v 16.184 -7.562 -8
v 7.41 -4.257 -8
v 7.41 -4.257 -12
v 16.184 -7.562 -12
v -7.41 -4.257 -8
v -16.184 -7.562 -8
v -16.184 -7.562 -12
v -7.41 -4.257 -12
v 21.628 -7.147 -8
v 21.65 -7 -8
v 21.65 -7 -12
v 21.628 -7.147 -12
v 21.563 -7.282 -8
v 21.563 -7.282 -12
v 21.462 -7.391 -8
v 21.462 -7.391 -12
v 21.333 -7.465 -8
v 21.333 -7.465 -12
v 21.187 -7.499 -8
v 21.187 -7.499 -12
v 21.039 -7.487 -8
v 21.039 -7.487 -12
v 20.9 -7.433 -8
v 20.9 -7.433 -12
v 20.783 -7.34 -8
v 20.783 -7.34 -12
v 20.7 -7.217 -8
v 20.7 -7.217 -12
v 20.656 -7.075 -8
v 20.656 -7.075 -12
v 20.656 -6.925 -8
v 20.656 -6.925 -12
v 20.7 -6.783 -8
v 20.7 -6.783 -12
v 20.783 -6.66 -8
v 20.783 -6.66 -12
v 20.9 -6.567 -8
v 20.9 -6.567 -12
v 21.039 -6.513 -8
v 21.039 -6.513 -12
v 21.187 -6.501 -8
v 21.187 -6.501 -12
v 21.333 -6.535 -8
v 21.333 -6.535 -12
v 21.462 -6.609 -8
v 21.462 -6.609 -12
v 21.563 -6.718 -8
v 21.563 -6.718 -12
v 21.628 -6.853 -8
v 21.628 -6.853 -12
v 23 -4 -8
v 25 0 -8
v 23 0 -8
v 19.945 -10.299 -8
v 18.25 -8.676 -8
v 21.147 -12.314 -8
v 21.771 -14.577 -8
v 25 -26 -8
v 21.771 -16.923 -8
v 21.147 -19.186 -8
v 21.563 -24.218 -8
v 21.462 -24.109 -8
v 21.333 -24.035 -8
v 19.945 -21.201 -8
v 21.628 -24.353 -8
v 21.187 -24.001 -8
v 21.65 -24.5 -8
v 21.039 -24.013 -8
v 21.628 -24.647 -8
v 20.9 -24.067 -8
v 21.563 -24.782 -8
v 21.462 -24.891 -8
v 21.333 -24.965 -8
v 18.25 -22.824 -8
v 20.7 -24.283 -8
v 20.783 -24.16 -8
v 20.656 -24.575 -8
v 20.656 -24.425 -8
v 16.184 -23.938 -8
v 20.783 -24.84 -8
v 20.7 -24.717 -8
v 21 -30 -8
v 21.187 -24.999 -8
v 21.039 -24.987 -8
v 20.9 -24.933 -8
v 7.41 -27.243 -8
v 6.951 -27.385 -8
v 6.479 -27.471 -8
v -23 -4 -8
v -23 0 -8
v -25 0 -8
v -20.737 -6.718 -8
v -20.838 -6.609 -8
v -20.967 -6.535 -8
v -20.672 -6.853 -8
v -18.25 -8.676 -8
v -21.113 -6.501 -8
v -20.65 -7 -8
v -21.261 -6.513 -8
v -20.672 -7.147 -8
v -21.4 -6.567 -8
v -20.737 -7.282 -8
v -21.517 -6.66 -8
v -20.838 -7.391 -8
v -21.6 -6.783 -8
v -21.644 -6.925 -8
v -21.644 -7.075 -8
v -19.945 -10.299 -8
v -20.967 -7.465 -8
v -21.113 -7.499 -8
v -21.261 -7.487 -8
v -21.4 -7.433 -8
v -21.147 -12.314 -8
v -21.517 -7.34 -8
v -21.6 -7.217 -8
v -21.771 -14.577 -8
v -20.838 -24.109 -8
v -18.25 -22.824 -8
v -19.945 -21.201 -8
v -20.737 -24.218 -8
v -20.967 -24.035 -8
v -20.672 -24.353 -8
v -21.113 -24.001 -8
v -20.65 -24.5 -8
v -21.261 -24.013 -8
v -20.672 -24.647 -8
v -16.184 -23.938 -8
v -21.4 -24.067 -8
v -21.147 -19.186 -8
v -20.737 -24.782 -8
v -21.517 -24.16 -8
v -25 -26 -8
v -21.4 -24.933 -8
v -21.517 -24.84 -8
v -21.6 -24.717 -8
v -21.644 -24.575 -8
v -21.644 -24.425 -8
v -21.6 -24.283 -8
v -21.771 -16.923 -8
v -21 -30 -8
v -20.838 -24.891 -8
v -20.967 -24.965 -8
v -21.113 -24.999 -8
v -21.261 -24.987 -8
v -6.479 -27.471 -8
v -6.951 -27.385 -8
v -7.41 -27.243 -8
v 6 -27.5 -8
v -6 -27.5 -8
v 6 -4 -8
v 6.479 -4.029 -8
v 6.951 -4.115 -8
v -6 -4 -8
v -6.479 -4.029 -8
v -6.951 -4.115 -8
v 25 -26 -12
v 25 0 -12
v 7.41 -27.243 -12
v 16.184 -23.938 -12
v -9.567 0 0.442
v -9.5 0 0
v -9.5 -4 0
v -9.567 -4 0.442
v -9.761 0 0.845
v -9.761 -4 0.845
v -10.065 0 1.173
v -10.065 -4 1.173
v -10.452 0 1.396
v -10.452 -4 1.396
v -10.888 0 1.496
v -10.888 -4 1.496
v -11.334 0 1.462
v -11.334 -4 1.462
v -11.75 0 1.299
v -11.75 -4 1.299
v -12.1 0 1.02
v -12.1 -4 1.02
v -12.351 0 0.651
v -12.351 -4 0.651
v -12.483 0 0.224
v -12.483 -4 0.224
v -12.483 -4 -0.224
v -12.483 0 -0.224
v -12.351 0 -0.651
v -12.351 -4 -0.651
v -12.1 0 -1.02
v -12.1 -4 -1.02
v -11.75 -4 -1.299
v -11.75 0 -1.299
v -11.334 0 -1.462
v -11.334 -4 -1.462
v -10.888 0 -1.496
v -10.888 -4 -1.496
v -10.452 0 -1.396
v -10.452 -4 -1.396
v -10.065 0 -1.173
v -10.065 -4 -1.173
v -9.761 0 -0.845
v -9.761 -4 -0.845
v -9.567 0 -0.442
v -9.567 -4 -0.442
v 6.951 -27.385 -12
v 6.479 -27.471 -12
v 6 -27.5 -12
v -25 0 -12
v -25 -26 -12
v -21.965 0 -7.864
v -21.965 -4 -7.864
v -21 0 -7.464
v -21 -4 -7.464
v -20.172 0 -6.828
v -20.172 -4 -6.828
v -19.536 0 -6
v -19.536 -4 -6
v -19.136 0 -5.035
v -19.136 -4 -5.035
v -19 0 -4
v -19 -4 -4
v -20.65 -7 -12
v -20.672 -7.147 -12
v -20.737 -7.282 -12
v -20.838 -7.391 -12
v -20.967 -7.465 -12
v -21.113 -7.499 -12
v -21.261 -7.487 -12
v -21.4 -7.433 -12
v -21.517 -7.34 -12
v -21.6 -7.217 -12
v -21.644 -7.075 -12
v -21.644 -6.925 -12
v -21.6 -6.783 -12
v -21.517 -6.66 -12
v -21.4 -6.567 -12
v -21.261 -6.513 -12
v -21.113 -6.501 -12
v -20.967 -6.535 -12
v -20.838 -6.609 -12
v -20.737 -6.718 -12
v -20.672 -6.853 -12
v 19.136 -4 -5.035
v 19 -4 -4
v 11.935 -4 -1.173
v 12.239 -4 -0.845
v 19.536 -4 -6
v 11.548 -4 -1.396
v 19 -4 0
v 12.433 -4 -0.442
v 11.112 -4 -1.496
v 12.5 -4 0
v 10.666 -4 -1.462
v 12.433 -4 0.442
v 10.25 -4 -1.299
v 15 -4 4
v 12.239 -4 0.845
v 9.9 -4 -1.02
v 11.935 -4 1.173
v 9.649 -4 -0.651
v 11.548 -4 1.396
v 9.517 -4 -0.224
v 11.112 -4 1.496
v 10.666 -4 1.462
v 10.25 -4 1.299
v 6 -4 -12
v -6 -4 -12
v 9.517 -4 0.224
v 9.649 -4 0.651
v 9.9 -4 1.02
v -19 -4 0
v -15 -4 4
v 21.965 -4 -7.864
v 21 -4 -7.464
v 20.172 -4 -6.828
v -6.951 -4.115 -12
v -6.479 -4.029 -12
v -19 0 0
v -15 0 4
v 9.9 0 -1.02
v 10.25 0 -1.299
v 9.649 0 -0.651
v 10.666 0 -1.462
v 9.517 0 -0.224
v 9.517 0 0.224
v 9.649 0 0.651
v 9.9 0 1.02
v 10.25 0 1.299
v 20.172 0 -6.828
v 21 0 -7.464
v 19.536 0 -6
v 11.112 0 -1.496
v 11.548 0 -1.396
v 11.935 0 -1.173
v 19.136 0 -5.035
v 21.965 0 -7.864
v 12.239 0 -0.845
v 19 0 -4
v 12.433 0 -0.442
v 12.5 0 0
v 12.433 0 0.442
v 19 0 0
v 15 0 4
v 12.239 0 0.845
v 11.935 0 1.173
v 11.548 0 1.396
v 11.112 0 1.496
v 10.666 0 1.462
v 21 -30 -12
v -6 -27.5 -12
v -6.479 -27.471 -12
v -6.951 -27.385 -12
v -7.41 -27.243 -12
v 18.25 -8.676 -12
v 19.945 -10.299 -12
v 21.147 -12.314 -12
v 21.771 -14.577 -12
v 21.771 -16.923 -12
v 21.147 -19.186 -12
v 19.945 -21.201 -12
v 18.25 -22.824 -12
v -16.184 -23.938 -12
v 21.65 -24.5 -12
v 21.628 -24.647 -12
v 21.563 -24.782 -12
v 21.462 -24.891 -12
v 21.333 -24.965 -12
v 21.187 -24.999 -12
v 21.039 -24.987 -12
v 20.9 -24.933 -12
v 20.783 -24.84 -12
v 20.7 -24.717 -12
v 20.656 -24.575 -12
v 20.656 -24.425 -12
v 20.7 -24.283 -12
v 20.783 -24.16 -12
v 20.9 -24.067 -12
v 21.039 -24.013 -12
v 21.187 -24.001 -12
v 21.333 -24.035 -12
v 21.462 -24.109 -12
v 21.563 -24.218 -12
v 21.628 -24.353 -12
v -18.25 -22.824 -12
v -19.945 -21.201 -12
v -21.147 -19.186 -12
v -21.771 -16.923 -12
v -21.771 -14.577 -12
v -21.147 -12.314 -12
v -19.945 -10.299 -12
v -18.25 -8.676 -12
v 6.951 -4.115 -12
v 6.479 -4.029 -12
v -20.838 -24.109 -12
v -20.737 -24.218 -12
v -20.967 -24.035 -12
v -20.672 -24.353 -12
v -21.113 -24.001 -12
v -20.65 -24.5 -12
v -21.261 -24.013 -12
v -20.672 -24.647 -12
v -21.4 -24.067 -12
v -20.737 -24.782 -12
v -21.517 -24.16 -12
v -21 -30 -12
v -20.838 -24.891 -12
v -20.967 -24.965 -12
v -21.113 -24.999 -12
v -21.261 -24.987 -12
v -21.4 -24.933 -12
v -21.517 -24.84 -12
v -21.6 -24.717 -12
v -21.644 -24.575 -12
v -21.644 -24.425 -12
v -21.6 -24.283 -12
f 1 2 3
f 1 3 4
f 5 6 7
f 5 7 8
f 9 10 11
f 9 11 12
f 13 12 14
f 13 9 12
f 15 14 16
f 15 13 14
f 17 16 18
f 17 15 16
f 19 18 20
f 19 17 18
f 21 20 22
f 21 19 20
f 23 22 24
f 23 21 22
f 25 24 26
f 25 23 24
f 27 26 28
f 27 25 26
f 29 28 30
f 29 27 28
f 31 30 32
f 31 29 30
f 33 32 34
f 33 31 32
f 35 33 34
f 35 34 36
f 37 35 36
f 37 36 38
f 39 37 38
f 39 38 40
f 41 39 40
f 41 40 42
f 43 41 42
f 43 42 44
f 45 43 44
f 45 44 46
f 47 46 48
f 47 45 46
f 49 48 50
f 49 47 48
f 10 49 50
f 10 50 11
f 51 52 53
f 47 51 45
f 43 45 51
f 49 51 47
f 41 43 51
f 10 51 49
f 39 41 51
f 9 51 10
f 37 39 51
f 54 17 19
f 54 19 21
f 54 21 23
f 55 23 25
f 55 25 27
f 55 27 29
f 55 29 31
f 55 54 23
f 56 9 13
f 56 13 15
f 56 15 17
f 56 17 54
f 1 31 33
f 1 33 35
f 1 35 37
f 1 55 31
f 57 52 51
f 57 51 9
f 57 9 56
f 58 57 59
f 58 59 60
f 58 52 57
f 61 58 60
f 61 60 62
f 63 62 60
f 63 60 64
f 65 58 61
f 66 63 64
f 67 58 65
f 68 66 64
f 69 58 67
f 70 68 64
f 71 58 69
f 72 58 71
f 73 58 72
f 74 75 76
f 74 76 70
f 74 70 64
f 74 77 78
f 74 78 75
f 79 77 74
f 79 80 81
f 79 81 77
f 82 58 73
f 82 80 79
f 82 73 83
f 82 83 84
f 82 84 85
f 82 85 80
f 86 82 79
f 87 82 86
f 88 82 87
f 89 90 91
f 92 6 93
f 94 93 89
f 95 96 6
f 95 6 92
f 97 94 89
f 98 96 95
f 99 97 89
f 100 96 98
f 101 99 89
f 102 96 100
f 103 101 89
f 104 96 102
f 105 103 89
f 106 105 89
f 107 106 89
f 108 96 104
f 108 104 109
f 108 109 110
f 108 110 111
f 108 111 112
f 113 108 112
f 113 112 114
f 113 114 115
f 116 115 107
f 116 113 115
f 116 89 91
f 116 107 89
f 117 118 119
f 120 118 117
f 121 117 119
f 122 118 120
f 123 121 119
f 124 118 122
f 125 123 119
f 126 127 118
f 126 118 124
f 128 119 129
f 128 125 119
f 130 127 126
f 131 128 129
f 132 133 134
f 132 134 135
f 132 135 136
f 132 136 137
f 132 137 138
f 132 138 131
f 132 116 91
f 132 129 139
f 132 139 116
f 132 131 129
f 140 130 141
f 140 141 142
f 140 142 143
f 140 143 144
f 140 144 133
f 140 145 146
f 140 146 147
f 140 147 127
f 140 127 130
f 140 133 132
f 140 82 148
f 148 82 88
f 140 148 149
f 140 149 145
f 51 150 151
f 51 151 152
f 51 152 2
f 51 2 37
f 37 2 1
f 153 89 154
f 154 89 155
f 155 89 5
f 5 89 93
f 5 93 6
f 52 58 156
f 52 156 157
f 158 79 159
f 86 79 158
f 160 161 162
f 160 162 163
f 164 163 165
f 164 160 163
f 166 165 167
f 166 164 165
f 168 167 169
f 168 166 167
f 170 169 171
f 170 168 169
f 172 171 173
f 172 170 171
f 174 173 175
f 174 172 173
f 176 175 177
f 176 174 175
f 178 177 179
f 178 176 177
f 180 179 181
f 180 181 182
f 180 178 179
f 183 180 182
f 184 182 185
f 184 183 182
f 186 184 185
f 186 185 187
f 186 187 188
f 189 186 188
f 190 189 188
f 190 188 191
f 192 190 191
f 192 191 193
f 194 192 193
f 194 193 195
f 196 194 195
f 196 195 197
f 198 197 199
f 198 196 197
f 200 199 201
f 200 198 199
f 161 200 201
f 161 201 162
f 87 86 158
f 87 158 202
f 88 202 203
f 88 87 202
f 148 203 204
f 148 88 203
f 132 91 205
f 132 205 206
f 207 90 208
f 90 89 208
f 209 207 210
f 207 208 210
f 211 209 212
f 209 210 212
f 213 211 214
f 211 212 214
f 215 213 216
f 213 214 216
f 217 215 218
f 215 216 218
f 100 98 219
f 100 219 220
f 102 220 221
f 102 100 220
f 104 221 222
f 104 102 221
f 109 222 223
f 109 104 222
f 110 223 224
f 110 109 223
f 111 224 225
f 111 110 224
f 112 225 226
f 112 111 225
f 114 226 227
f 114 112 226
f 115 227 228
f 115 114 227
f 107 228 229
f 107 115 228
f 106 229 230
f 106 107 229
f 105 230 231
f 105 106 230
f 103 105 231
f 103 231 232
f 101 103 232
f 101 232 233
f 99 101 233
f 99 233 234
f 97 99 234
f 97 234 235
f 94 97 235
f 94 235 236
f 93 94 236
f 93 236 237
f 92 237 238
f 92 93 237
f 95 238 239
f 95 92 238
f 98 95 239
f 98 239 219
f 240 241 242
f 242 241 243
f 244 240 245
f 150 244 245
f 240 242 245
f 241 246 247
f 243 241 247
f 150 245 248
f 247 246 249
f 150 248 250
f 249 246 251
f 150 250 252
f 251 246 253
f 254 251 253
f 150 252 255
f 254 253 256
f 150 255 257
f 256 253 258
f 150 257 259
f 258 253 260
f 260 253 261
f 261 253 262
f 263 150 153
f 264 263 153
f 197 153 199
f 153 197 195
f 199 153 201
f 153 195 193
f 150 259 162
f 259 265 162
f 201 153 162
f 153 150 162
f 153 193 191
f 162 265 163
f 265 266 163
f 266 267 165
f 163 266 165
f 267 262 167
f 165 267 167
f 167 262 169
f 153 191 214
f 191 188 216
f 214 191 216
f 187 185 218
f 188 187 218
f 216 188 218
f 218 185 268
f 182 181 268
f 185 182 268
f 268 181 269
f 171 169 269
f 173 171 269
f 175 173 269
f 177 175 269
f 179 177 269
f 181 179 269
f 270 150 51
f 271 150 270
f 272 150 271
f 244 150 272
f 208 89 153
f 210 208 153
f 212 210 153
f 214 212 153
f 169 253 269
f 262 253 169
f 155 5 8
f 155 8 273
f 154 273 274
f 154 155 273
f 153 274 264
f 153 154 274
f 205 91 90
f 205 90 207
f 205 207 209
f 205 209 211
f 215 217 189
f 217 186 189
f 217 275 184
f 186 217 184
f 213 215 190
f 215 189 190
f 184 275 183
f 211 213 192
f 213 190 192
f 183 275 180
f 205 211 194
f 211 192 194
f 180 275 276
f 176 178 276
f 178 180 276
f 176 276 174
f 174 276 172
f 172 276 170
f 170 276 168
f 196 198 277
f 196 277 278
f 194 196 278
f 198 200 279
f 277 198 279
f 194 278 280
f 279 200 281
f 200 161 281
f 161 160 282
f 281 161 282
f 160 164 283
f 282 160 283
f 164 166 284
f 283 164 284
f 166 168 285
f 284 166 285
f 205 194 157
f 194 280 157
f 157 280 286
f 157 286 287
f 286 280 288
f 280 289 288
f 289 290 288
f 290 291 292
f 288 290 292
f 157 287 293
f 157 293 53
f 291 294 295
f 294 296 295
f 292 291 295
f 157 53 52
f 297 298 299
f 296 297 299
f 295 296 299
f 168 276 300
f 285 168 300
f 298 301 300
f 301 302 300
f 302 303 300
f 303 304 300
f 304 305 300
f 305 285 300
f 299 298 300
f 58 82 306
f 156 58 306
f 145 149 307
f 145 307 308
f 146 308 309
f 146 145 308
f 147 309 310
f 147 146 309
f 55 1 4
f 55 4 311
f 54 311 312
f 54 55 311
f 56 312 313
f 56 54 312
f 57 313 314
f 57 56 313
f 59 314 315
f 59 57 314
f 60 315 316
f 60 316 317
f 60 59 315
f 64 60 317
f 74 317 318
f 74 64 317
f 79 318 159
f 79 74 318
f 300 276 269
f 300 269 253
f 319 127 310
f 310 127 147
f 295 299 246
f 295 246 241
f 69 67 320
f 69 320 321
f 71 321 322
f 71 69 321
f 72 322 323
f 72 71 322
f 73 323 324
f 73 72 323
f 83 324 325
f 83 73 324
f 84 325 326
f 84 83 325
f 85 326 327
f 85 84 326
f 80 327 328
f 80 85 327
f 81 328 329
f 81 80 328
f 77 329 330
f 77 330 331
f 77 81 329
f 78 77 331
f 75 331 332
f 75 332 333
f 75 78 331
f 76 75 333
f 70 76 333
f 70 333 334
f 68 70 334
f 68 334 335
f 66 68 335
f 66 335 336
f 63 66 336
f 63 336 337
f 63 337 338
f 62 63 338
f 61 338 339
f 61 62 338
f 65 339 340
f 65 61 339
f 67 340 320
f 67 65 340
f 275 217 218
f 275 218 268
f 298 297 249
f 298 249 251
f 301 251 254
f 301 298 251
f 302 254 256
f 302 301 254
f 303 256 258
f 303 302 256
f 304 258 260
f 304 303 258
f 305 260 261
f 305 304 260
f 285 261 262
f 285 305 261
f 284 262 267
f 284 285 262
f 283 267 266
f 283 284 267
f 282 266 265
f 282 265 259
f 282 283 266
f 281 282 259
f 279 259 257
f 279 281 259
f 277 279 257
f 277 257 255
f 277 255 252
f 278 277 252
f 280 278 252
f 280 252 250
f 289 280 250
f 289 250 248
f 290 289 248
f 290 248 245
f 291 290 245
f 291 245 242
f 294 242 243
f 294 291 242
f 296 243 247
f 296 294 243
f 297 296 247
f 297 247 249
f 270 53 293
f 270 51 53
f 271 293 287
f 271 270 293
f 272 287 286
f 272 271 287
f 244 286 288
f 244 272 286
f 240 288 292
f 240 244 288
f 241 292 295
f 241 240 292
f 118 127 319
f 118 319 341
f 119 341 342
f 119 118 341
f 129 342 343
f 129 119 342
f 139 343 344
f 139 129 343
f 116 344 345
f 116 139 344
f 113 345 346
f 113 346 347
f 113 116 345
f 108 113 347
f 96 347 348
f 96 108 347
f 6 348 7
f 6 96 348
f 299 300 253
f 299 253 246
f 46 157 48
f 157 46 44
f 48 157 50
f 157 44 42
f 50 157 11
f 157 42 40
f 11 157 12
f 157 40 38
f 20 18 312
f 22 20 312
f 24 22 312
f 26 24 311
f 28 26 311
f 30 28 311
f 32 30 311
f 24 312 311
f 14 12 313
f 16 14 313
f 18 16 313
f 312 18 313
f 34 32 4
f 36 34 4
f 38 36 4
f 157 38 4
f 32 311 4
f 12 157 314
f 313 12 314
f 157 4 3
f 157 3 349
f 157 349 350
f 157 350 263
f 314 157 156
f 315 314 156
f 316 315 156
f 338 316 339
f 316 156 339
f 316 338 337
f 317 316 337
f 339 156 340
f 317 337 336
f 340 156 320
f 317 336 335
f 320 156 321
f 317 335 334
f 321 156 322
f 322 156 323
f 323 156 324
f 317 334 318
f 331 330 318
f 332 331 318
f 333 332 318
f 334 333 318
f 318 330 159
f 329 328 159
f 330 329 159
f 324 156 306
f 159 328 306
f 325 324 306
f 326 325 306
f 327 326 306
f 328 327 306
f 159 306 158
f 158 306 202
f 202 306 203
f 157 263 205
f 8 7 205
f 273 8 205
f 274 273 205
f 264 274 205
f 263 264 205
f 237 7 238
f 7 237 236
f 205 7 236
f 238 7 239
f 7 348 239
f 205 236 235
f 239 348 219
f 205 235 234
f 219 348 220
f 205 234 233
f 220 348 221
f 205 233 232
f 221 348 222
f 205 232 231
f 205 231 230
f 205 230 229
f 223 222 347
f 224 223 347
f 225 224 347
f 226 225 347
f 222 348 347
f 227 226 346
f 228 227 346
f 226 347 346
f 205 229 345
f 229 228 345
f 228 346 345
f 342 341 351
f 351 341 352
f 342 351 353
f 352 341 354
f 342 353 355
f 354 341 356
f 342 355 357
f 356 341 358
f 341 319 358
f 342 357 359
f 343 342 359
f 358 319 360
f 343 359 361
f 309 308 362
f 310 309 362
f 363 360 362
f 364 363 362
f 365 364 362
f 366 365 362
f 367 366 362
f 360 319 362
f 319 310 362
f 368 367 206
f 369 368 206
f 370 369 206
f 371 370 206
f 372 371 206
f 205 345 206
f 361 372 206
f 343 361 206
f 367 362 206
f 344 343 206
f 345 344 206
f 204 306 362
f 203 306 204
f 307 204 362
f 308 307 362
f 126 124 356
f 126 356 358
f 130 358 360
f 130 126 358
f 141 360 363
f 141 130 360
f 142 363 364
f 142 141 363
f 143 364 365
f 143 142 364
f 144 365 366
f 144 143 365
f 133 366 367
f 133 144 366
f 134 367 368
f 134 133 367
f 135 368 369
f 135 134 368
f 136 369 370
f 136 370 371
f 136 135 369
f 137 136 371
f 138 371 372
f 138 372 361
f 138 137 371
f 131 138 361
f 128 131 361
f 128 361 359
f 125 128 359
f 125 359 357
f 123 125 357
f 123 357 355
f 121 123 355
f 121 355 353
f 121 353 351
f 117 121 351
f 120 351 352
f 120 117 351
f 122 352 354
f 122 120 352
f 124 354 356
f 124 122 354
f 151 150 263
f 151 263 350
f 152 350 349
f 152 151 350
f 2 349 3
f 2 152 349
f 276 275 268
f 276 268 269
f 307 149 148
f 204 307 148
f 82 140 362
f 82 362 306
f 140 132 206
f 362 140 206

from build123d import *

# Parameters (mm, degrees)
SKETCH_R             = 1.5
PAD_DEPTH            = 4
SKETCH001_R          = 0.5
PAD001_DEPTH         = 4
FILLET_R             = 4
CHAMFER_SIZE         = 4
BODY_PLACEMENT_ANGLE = 90


with BuildPart() as part:
    # Sketch → Pad (new body)
    with BuildSketch(Plane.XY):
        Polygon((-15, 4), (15, 4), (19, 0), (19, -8), (-19, -8), (-19, 0), align=None)
        with Locations((-11, 0)):
            Circle(SKETCH_R, mode=Mode.SUBTRACT)
        with Locations((11, 0)):
            Circle(SKETCH_R, mode=Mode.SUBTRACT)
    extrude(amount=PAD_DEPTH)

    # Sketch001 (on Face2 of Pad) → Pad001 (join)
    with BuildSketch(Plane.XZ.offset(8)):
        Polygon((-25, 30), (25, 30), (25, 0), (0, 0), (-25, 0), align=None)
        with Locations((-21.15, 24.5)):
            Circle(SKETCH001_R, mode=Mode.SUBTRACT)
        with Locations((-21.15, 7)):
            Circle(SKETCH001_R, mode=Mode.SUBTRACT)
        with Locations((21.15, 7)):
            Circle(SKETCH001_R, mode=Mode.SUBTRACT)
        with Locations((21.15, 24.5)):
            Circle(SKETCH001_R, mode=Mode.SUBTRACT)
        with BuildLine():
            ThreePointArc((-16.184193, 23.938422), (-21.85, 15.75), (-16.184193, 7.561578))
            Line((-16.184193, 7.561578), (-7.409917, 4.256721))
            ThreePointArc((-7.409917, 4.256721), (-6.716549, 4.064704), (-6, 4))
            Line((-6, 4), (0, 4))
            Line((6, 4), (0, 4))
            ThreePointArc((6, 4), (6.716549, 4.064704), (7.409917, 4.256721))
            Line((7.409917, 4.256721), (16.184193, 7.561578))
            ThreePointArc((16.184193, 7.561578), (21.85, 15.75), (16.184193, 23.938422))
            Line((16.184193, 23.938422), (7.409917, 27.243279))
            ThreePointArc((7.409917, 27.243279), (6.716549, 27.435296), (6, 27.5))
            Line((0, 27.5), (6, 27.5))
            Line((-6, 27.5), (0, 27.5))
            ThreePointArc((-6, 27.5), (-6.716549, 27.435296), (-7.409917, 27.243279))
            Line((-16.184193, 23.938422), (-7.409917, 27.243279))
        make_face(mode=Mode.SUBTRACT)
    extrude(amount=PAD001_DEPTH)

    # Fillet
    fillet_edges = [part.edges().sort_by_distance(p)[0] for p in [
        (19, -8, 2),
        (-19, -8, 2),
    ]]
    fillet(fillet_edges, radius=FILLET_R)

    # Chamfer
    chamfer_edges = [part.edges().sort_by_distance(p)[0] for p in [
        (-25, -10, 30),
        (25, -10, 30),
    ]]
    chamfer(chamfer_edges, length=CHAMFER_SIZE)


with BuildPart() as part_1:
    # Body placement: moved
    add(part.part.rotate(Axis((0, 0, 0), (1, 0, 0)), BODY_PLACEMENT_ANGLE))


solid = part_1.part
